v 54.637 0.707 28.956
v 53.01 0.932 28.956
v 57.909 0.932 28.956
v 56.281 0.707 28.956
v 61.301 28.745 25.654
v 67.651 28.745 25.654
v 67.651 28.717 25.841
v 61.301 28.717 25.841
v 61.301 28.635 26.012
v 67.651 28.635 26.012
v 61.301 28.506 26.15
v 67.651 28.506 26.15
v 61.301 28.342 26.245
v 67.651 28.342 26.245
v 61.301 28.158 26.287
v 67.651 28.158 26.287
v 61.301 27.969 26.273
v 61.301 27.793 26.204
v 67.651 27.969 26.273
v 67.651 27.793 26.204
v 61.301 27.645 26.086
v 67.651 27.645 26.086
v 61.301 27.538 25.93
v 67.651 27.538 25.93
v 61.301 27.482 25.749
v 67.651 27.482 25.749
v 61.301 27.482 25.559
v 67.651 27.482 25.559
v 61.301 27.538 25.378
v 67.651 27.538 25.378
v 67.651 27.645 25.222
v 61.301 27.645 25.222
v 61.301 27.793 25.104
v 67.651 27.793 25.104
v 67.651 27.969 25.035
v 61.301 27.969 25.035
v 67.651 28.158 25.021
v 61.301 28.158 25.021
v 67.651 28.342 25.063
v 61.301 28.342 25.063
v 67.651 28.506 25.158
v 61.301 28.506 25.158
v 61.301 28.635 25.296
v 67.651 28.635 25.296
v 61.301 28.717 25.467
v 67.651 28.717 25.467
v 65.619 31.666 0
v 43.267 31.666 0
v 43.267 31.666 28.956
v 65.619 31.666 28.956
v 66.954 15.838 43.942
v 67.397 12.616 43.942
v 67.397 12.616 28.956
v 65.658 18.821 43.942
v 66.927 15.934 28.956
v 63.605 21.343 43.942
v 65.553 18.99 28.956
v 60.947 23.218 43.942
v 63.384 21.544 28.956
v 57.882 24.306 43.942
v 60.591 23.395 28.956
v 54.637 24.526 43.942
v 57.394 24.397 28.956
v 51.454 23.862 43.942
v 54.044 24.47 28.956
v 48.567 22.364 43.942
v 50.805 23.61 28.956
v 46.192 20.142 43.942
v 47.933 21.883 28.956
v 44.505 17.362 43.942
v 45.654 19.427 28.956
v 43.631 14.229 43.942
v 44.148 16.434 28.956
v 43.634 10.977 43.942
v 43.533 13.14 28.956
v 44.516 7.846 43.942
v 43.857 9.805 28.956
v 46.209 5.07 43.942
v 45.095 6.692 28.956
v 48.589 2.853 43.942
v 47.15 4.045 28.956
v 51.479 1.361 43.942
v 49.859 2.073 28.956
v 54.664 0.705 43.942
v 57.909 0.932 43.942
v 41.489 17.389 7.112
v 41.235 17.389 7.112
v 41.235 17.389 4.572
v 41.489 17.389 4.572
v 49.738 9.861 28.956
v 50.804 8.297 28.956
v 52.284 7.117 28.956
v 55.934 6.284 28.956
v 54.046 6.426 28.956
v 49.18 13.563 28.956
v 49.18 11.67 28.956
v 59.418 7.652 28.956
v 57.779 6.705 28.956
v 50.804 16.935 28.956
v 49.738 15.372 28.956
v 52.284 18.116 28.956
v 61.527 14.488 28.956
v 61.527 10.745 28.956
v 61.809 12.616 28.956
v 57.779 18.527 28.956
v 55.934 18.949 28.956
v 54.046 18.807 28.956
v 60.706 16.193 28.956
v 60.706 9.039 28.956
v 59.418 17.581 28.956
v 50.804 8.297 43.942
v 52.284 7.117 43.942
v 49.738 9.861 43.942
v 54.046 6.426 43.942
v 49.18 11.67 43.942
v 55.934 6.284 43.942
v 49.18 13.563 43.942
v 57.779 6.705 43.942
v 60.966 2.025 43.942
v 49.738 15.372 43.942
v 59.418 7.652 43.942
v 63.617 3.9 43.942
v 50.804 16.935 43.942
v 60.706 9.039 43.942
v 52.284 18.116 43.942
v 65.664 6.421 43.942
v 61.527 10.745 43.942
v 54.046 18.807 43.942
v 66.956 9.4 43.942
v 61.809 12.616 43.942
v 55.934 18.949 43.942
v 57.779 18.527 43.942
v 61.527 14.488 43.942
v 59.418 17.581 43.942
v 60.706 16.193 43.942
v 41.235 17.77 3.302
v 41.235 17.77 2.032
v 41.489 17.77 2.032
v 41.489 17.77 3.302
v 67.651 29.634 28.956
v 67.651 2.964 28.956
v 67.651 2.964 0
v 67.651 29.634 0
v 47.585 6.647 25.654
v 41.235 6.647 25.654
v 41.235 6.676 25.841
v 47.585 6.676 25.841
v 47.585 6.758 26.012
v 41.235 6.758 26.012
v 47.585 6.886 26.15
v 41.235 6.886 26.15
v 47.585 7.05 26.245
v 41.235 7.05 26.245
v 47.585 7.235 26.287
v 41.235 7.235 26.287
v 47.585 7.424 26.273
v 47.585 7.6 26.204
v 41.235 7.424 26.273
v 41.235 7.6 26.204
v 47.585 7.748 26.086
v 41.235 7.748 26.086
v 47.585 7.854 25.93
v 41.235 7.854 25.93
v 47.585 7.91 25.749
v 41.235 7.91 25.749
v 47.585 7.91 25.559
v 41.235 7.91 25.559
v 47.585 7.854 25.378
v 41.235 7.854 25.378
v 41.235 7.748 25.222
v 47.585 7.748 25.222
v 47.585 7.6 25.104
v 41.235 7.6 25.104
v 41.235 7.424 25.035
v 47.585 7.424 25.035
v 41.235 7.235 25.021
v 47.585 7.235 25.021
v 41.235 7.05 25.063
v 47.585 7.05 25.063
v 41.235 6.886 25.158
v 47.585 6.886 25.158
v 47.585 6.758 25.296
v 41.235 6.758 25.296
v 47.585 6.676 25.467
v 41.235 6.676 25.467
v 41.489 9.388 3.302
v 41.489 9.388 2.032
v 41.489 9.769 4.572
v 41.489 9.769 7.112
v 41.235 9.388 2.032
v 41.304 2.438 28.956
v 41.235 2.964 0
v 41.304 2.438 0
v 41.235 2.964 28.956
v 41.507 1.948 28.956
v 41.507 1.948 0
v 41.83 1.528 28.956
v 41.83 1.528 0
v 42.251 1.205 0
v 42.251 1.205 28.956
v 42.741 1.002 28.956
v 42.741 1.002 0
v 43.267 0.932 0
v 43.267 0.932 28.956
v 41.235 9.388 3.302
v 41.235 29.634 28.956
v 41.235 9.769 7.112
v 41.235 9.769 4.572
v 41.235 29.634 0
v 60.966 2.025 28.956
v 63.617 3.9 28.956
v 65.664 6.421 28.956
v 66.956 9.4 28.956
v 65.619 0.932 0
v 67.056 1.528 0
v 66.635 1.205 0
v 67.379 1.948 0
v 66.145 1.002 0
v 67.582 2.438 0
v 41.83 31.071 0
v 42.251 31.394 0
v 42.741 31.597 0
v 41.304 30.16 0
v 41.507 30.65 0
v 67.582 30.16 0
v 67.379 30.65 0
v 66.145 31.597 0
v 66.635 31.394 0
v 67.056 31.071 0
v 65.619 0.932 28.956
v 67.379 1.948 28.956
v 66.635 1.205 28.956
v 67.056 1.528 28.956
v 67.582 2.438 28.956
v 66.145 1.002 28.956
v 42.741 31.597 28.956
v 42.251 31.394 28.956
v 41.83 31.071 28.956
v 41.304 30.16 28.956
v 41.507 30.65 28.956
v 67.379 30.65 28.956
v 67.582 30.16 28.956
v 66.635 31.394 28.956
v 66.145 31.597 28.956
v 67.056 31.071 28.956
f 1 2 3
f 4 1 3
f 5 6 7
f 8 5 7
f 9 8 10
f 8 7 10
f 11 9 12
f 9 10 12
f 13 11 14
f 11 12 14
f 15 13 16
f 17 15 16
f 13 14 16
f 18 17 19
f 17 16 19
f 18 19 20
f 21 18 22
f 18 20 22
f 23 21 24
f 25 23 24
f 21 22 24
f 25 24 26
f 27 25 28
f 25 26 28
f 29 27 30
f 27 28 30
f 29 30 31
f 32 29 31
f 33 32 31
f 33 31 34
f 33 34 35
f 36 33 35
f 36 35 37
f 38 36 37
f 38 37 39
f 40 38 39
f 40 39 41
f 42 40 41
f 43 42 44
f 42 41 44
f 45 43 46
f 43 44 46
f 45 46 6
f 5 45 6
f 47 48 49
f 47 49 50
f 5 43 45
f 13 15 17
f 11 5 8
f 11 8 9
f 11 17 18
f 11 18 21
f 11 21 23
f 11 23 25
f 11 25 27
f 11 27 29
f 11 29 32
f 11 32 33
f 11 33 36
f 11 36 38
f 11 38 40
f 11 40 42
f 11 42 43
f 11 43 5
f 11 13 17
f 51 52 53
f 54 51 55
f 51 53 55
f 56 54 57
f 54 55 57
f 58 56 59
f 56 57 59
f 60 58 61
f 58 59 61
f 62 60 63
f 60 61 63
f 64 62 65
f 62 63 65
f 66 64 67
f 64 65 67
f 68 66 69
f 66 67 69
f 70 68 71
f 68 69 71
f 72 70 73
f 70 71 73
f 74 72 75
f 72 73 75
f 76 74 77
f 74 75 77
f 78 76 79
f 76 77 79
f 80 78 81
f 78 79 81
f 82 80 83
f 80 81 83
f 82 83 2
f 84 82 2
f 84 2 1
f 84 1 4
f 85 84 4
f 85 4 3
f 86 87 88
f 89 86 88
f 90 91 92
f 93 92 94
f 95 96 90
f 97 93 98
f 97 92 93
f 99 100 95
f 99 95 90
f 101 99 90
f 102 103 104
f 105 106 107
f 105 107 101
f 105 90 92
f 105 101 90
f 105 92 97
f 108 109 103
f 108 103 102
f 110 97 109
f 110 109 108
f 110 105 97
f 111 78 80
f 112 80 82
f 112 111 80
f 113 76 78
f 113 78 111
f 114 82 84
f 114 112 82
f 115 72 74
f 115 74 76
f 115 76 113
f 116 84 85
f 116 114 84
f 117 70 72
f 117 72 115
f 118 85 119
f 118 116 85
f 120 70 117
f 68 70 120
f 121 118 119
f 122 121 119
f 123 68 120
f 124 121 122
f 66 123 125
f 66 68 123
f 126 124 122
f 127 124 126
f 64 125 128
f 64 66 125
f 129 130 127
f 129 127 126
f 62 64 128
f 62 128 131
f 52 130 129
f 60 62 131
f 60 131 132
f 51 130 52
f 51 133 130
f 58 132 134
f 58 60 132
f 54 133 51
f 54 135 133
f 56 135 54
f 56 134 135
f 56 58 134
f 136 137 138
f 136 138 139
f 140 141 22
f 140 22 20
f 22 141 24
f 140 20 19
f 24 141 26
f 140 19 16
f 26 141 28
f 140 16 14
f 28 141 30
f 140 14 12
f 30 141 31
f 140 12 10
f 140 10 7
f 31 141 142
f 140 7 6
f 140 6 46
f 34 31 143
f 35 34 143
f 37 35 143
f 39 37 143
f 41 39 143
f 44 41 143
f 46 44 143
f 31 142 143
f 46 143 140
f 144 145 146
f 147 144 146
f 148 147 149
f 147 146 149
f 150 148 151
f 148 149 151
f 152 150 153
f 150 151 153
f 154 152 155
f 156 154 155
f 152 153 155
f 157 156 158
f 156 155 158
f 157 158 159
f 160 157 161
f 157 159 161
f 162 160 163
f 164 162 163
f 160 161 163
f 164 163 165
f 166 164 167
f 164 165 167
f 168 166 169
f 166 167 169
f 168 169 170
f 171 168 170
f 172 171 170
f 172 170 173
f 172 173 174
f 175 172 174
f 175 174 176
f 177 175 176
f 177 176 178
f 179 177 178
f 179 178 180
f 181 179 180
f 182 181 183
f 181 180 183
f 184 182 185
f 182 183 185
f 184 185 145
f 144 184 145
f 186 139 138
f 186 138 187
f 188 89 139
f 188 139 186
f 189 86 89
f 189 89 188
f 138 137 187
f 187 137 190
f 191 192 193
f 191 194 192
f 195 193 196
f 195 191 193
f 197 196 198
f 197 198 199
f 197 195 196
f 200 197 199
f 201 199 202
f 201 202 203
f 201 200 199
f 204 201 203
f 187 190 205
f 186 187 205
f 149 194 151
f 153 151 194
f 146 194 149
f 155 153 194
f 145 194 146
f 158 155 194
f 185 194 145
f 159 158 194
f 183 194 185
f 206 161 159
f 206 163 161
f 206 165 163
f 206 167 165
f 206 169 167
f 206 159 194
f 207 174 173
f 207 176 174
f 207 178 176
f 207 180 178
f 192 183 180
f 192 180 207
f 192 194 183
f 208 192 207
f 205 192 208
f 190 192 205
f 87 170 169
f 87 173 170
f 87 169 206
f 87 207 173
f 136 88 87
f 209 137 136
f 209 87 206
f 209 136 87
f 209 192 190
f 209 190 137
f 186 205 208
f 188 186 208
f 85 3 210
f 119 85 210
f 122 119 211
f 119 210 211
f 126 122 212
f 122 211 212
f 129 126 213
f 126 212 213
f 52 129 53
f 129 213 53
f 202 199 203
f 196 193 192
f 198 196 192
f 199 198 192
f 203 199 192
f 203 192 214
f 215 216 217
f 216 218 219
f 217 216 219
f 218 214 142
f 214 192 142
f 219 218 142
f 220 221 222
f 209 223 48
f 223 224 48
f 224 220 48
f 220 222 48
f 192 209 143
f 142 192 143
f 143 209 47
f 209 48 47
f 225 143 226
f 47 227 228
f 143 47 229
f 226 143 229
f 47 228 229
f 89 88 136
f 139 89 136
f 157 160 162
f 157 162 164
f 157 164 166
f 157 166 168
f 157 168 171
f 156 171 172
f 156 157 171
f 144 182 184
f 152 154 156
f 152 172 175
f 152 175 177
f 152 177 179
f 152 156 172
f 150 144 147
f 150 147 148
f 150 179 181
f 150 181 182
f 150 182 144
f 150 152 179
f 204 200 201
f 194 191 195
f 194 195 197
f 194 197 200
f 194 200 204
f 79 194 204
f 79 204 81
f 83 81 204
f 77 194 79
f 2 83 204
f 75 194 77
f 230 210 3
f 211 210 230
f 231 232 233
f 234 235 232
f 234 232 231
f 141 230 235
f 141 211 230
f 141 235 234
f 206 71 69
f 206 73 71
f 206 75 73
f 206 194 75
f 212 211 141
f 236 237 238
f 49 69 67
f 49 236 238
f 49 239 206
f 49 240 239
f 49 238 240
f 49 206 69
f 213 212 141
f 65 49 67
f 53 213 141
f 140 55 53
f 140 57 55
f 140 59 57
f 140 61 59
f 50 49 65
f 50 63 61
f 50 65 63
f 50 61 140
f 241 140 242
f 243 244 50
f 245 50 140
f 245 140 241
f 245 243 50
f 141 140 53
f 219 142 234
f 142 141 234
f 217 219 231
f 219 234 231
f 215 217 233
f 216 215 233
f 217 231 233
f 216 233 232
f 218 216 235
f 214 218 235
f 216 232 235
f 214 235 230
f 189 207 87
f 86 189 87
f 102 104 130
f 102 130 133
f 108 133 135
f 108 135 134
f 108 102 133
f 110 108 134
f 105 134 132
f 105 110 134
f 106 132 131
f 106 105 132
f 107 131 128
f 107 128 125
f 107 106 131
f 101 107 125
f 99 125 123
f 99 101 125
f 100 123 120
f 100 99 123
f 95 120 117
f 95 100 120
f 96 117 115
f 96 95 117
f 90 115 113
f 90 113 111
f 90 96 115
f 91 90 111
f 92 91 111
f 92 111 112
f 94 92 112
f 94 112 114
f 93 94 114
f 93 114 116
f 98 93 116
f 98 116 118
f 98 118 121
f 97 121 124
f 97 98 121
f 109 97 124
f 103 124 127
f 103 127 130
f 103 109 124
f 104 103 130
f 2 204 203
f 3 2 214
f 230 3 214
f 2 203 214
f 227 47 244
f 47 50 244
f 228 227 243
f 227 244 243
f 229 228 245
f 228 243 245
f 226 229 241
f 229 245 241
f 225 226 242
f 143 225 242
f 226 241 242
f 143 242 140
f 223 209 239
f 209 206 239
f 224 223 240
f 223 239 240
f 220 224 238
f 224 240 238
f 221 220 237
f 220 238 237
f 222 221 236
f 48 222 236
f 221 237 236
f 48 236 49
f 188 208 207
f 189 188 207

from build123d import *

# Parameters (mm, degrees)
F0_R      = 11.938
F1_DEPTH  = 14.986
F2_R      = 5.2835878492
F3_DEPTH  = 6.35
F4_W      = 26.416
F4_H      = 30.734
F5_DEPTH  = 28.956
F6_R      = 0.635
F7_DEPTH  = 6.35
F8_R      = 0.635
F9_DEPTH  = 6.35
F10_R     = 6.35
F11_DEPTH = 14.986
F13_R     = 2.032
F14_W     = 0.381
F14_H     = 1.27
F15_DEPTH = 0.254


with BuildPart() as f1:
    # F0 (on Top) → F1 (new body)
    with BuildSketch(Plane.XY):
        Circle(F0_R)
    extrude(amount=F1_DEPTH)

    # F2 (on face) → F3 (cut)
    with BuildSketch(Plane.XY.offset(14.986)):
        Circle(F2_R)
    extrude(amount=-F3_DEPTH, mode=Mode.SUBTRACT)


with BuildPart() as f5:
    # F4 (on Top) → F5 (new body)
    with BuildSketch(Plane.XY):
        with Locations((54.4431246817, 16.2993484654)):
            Rectangle(F4_W, F4_H)
    extrude(amount=F5_DEPTH)

    # F6 (on face) → F7 (cut)
    with BuildSketch(Plane(origin=(41.2351246817, 0, 0), x_dir=(0, -1, 0), z_dir=(-1, 0, 0))):
        with Locations((-7.2823484654, 25.654)):
            Circle(F6_R)
    extrude(amount=-F7_DEPTH, mode=Mode.SUBTRACT)

    # F8 (on face) → F9 (cut)
    with BuildSketch(Plane.YZ.offset(67.6511246817)):
        with Locations((28.1103484654, 25.654)):
            Circle(F8_R)
    extrude(amount=-F9_DEPTH, mode=Mode.SUBTRACT)

    # F10 (on face) → F11 (join)
    with BuildSketch(Plane.XY.offset(28.956)):
        with BuildLine():
            ThreePointArc((57.908611975, 0.9323484654), (64.7262122314, 5.0905971842), (67.3971246817, 12.6163484654))
            ThreePointArc((67.3971246817, 12.6163484654), (47.9333734005, 21.8834360151), (53.0096373884, 0.9323484654))
            Line((53.0096373884, 0.9323484654), (57.908611975, 0.9323484654))
        make_face()
        with Locations((55.4591246817, 12.6163484654)):
            Circle(F10_R, mode=Mode.SUBTRACT)
        with BuildLine():
            Line((57.908611975, 0.9323484654), (53.0096373884, 0.9323484654))
            ThreePointArc((53.0096373884, 0.9323484654), (55.4591246817, 0.6783484654), (57.908611975, 0.9323484654))
        make_face()
    extrude(amount=F11_DEPTH)

    # F13
    f13_edges = [f5.edges().sort_by_distance(p)[0] for p in [
        (41.235125, 31.666348, 14.478),
        (67.651125, 31.666348, 14.478),
        (41.235125, 0.932348, 14.478),
        (67.651125, 0.932348, 14.478),
    ]]
    fillet(f13_edges, radius=F13_R)

    # F14 (on face) → F15 (cut)
    with BuildSketch(Plane(origin=(41.2351246817, 0, 0), x_dir=(0, -1, 0), z_dir=(-1, 0, 0))):
        Polygon((-17.3889424292, 3.302), (-17.3889424292, 2.032), (-9.7689424292, 2.032), (-9.7689424292, 3.302), (-9.7689424292, 4.572), (-9.7689424292, 7.112), (-17.3889424292, 7.112), (-17.3889424292, 4.572), align=None)
        with Locations((-17.5794424292, 2.667)):
            Rectangle(F14_W, F14_H)
        Polygon((-17.7699424292, 3.302), (-17.3889424292, 3.302), (-17.3889424292, 4.572), align=None)
        Polygon((-9.7689424292, 4.572), (-9.7689424292, 3.302), (-9.3879424292, 3.302), align=None)
        with Locations((-9.5784424292, 2.667)):
            Rectangle(F14_W, F14_H)
    extrude(amount=-F15_DEPTH, mode=Mode.SUBTRACT)


solid = f5.part
